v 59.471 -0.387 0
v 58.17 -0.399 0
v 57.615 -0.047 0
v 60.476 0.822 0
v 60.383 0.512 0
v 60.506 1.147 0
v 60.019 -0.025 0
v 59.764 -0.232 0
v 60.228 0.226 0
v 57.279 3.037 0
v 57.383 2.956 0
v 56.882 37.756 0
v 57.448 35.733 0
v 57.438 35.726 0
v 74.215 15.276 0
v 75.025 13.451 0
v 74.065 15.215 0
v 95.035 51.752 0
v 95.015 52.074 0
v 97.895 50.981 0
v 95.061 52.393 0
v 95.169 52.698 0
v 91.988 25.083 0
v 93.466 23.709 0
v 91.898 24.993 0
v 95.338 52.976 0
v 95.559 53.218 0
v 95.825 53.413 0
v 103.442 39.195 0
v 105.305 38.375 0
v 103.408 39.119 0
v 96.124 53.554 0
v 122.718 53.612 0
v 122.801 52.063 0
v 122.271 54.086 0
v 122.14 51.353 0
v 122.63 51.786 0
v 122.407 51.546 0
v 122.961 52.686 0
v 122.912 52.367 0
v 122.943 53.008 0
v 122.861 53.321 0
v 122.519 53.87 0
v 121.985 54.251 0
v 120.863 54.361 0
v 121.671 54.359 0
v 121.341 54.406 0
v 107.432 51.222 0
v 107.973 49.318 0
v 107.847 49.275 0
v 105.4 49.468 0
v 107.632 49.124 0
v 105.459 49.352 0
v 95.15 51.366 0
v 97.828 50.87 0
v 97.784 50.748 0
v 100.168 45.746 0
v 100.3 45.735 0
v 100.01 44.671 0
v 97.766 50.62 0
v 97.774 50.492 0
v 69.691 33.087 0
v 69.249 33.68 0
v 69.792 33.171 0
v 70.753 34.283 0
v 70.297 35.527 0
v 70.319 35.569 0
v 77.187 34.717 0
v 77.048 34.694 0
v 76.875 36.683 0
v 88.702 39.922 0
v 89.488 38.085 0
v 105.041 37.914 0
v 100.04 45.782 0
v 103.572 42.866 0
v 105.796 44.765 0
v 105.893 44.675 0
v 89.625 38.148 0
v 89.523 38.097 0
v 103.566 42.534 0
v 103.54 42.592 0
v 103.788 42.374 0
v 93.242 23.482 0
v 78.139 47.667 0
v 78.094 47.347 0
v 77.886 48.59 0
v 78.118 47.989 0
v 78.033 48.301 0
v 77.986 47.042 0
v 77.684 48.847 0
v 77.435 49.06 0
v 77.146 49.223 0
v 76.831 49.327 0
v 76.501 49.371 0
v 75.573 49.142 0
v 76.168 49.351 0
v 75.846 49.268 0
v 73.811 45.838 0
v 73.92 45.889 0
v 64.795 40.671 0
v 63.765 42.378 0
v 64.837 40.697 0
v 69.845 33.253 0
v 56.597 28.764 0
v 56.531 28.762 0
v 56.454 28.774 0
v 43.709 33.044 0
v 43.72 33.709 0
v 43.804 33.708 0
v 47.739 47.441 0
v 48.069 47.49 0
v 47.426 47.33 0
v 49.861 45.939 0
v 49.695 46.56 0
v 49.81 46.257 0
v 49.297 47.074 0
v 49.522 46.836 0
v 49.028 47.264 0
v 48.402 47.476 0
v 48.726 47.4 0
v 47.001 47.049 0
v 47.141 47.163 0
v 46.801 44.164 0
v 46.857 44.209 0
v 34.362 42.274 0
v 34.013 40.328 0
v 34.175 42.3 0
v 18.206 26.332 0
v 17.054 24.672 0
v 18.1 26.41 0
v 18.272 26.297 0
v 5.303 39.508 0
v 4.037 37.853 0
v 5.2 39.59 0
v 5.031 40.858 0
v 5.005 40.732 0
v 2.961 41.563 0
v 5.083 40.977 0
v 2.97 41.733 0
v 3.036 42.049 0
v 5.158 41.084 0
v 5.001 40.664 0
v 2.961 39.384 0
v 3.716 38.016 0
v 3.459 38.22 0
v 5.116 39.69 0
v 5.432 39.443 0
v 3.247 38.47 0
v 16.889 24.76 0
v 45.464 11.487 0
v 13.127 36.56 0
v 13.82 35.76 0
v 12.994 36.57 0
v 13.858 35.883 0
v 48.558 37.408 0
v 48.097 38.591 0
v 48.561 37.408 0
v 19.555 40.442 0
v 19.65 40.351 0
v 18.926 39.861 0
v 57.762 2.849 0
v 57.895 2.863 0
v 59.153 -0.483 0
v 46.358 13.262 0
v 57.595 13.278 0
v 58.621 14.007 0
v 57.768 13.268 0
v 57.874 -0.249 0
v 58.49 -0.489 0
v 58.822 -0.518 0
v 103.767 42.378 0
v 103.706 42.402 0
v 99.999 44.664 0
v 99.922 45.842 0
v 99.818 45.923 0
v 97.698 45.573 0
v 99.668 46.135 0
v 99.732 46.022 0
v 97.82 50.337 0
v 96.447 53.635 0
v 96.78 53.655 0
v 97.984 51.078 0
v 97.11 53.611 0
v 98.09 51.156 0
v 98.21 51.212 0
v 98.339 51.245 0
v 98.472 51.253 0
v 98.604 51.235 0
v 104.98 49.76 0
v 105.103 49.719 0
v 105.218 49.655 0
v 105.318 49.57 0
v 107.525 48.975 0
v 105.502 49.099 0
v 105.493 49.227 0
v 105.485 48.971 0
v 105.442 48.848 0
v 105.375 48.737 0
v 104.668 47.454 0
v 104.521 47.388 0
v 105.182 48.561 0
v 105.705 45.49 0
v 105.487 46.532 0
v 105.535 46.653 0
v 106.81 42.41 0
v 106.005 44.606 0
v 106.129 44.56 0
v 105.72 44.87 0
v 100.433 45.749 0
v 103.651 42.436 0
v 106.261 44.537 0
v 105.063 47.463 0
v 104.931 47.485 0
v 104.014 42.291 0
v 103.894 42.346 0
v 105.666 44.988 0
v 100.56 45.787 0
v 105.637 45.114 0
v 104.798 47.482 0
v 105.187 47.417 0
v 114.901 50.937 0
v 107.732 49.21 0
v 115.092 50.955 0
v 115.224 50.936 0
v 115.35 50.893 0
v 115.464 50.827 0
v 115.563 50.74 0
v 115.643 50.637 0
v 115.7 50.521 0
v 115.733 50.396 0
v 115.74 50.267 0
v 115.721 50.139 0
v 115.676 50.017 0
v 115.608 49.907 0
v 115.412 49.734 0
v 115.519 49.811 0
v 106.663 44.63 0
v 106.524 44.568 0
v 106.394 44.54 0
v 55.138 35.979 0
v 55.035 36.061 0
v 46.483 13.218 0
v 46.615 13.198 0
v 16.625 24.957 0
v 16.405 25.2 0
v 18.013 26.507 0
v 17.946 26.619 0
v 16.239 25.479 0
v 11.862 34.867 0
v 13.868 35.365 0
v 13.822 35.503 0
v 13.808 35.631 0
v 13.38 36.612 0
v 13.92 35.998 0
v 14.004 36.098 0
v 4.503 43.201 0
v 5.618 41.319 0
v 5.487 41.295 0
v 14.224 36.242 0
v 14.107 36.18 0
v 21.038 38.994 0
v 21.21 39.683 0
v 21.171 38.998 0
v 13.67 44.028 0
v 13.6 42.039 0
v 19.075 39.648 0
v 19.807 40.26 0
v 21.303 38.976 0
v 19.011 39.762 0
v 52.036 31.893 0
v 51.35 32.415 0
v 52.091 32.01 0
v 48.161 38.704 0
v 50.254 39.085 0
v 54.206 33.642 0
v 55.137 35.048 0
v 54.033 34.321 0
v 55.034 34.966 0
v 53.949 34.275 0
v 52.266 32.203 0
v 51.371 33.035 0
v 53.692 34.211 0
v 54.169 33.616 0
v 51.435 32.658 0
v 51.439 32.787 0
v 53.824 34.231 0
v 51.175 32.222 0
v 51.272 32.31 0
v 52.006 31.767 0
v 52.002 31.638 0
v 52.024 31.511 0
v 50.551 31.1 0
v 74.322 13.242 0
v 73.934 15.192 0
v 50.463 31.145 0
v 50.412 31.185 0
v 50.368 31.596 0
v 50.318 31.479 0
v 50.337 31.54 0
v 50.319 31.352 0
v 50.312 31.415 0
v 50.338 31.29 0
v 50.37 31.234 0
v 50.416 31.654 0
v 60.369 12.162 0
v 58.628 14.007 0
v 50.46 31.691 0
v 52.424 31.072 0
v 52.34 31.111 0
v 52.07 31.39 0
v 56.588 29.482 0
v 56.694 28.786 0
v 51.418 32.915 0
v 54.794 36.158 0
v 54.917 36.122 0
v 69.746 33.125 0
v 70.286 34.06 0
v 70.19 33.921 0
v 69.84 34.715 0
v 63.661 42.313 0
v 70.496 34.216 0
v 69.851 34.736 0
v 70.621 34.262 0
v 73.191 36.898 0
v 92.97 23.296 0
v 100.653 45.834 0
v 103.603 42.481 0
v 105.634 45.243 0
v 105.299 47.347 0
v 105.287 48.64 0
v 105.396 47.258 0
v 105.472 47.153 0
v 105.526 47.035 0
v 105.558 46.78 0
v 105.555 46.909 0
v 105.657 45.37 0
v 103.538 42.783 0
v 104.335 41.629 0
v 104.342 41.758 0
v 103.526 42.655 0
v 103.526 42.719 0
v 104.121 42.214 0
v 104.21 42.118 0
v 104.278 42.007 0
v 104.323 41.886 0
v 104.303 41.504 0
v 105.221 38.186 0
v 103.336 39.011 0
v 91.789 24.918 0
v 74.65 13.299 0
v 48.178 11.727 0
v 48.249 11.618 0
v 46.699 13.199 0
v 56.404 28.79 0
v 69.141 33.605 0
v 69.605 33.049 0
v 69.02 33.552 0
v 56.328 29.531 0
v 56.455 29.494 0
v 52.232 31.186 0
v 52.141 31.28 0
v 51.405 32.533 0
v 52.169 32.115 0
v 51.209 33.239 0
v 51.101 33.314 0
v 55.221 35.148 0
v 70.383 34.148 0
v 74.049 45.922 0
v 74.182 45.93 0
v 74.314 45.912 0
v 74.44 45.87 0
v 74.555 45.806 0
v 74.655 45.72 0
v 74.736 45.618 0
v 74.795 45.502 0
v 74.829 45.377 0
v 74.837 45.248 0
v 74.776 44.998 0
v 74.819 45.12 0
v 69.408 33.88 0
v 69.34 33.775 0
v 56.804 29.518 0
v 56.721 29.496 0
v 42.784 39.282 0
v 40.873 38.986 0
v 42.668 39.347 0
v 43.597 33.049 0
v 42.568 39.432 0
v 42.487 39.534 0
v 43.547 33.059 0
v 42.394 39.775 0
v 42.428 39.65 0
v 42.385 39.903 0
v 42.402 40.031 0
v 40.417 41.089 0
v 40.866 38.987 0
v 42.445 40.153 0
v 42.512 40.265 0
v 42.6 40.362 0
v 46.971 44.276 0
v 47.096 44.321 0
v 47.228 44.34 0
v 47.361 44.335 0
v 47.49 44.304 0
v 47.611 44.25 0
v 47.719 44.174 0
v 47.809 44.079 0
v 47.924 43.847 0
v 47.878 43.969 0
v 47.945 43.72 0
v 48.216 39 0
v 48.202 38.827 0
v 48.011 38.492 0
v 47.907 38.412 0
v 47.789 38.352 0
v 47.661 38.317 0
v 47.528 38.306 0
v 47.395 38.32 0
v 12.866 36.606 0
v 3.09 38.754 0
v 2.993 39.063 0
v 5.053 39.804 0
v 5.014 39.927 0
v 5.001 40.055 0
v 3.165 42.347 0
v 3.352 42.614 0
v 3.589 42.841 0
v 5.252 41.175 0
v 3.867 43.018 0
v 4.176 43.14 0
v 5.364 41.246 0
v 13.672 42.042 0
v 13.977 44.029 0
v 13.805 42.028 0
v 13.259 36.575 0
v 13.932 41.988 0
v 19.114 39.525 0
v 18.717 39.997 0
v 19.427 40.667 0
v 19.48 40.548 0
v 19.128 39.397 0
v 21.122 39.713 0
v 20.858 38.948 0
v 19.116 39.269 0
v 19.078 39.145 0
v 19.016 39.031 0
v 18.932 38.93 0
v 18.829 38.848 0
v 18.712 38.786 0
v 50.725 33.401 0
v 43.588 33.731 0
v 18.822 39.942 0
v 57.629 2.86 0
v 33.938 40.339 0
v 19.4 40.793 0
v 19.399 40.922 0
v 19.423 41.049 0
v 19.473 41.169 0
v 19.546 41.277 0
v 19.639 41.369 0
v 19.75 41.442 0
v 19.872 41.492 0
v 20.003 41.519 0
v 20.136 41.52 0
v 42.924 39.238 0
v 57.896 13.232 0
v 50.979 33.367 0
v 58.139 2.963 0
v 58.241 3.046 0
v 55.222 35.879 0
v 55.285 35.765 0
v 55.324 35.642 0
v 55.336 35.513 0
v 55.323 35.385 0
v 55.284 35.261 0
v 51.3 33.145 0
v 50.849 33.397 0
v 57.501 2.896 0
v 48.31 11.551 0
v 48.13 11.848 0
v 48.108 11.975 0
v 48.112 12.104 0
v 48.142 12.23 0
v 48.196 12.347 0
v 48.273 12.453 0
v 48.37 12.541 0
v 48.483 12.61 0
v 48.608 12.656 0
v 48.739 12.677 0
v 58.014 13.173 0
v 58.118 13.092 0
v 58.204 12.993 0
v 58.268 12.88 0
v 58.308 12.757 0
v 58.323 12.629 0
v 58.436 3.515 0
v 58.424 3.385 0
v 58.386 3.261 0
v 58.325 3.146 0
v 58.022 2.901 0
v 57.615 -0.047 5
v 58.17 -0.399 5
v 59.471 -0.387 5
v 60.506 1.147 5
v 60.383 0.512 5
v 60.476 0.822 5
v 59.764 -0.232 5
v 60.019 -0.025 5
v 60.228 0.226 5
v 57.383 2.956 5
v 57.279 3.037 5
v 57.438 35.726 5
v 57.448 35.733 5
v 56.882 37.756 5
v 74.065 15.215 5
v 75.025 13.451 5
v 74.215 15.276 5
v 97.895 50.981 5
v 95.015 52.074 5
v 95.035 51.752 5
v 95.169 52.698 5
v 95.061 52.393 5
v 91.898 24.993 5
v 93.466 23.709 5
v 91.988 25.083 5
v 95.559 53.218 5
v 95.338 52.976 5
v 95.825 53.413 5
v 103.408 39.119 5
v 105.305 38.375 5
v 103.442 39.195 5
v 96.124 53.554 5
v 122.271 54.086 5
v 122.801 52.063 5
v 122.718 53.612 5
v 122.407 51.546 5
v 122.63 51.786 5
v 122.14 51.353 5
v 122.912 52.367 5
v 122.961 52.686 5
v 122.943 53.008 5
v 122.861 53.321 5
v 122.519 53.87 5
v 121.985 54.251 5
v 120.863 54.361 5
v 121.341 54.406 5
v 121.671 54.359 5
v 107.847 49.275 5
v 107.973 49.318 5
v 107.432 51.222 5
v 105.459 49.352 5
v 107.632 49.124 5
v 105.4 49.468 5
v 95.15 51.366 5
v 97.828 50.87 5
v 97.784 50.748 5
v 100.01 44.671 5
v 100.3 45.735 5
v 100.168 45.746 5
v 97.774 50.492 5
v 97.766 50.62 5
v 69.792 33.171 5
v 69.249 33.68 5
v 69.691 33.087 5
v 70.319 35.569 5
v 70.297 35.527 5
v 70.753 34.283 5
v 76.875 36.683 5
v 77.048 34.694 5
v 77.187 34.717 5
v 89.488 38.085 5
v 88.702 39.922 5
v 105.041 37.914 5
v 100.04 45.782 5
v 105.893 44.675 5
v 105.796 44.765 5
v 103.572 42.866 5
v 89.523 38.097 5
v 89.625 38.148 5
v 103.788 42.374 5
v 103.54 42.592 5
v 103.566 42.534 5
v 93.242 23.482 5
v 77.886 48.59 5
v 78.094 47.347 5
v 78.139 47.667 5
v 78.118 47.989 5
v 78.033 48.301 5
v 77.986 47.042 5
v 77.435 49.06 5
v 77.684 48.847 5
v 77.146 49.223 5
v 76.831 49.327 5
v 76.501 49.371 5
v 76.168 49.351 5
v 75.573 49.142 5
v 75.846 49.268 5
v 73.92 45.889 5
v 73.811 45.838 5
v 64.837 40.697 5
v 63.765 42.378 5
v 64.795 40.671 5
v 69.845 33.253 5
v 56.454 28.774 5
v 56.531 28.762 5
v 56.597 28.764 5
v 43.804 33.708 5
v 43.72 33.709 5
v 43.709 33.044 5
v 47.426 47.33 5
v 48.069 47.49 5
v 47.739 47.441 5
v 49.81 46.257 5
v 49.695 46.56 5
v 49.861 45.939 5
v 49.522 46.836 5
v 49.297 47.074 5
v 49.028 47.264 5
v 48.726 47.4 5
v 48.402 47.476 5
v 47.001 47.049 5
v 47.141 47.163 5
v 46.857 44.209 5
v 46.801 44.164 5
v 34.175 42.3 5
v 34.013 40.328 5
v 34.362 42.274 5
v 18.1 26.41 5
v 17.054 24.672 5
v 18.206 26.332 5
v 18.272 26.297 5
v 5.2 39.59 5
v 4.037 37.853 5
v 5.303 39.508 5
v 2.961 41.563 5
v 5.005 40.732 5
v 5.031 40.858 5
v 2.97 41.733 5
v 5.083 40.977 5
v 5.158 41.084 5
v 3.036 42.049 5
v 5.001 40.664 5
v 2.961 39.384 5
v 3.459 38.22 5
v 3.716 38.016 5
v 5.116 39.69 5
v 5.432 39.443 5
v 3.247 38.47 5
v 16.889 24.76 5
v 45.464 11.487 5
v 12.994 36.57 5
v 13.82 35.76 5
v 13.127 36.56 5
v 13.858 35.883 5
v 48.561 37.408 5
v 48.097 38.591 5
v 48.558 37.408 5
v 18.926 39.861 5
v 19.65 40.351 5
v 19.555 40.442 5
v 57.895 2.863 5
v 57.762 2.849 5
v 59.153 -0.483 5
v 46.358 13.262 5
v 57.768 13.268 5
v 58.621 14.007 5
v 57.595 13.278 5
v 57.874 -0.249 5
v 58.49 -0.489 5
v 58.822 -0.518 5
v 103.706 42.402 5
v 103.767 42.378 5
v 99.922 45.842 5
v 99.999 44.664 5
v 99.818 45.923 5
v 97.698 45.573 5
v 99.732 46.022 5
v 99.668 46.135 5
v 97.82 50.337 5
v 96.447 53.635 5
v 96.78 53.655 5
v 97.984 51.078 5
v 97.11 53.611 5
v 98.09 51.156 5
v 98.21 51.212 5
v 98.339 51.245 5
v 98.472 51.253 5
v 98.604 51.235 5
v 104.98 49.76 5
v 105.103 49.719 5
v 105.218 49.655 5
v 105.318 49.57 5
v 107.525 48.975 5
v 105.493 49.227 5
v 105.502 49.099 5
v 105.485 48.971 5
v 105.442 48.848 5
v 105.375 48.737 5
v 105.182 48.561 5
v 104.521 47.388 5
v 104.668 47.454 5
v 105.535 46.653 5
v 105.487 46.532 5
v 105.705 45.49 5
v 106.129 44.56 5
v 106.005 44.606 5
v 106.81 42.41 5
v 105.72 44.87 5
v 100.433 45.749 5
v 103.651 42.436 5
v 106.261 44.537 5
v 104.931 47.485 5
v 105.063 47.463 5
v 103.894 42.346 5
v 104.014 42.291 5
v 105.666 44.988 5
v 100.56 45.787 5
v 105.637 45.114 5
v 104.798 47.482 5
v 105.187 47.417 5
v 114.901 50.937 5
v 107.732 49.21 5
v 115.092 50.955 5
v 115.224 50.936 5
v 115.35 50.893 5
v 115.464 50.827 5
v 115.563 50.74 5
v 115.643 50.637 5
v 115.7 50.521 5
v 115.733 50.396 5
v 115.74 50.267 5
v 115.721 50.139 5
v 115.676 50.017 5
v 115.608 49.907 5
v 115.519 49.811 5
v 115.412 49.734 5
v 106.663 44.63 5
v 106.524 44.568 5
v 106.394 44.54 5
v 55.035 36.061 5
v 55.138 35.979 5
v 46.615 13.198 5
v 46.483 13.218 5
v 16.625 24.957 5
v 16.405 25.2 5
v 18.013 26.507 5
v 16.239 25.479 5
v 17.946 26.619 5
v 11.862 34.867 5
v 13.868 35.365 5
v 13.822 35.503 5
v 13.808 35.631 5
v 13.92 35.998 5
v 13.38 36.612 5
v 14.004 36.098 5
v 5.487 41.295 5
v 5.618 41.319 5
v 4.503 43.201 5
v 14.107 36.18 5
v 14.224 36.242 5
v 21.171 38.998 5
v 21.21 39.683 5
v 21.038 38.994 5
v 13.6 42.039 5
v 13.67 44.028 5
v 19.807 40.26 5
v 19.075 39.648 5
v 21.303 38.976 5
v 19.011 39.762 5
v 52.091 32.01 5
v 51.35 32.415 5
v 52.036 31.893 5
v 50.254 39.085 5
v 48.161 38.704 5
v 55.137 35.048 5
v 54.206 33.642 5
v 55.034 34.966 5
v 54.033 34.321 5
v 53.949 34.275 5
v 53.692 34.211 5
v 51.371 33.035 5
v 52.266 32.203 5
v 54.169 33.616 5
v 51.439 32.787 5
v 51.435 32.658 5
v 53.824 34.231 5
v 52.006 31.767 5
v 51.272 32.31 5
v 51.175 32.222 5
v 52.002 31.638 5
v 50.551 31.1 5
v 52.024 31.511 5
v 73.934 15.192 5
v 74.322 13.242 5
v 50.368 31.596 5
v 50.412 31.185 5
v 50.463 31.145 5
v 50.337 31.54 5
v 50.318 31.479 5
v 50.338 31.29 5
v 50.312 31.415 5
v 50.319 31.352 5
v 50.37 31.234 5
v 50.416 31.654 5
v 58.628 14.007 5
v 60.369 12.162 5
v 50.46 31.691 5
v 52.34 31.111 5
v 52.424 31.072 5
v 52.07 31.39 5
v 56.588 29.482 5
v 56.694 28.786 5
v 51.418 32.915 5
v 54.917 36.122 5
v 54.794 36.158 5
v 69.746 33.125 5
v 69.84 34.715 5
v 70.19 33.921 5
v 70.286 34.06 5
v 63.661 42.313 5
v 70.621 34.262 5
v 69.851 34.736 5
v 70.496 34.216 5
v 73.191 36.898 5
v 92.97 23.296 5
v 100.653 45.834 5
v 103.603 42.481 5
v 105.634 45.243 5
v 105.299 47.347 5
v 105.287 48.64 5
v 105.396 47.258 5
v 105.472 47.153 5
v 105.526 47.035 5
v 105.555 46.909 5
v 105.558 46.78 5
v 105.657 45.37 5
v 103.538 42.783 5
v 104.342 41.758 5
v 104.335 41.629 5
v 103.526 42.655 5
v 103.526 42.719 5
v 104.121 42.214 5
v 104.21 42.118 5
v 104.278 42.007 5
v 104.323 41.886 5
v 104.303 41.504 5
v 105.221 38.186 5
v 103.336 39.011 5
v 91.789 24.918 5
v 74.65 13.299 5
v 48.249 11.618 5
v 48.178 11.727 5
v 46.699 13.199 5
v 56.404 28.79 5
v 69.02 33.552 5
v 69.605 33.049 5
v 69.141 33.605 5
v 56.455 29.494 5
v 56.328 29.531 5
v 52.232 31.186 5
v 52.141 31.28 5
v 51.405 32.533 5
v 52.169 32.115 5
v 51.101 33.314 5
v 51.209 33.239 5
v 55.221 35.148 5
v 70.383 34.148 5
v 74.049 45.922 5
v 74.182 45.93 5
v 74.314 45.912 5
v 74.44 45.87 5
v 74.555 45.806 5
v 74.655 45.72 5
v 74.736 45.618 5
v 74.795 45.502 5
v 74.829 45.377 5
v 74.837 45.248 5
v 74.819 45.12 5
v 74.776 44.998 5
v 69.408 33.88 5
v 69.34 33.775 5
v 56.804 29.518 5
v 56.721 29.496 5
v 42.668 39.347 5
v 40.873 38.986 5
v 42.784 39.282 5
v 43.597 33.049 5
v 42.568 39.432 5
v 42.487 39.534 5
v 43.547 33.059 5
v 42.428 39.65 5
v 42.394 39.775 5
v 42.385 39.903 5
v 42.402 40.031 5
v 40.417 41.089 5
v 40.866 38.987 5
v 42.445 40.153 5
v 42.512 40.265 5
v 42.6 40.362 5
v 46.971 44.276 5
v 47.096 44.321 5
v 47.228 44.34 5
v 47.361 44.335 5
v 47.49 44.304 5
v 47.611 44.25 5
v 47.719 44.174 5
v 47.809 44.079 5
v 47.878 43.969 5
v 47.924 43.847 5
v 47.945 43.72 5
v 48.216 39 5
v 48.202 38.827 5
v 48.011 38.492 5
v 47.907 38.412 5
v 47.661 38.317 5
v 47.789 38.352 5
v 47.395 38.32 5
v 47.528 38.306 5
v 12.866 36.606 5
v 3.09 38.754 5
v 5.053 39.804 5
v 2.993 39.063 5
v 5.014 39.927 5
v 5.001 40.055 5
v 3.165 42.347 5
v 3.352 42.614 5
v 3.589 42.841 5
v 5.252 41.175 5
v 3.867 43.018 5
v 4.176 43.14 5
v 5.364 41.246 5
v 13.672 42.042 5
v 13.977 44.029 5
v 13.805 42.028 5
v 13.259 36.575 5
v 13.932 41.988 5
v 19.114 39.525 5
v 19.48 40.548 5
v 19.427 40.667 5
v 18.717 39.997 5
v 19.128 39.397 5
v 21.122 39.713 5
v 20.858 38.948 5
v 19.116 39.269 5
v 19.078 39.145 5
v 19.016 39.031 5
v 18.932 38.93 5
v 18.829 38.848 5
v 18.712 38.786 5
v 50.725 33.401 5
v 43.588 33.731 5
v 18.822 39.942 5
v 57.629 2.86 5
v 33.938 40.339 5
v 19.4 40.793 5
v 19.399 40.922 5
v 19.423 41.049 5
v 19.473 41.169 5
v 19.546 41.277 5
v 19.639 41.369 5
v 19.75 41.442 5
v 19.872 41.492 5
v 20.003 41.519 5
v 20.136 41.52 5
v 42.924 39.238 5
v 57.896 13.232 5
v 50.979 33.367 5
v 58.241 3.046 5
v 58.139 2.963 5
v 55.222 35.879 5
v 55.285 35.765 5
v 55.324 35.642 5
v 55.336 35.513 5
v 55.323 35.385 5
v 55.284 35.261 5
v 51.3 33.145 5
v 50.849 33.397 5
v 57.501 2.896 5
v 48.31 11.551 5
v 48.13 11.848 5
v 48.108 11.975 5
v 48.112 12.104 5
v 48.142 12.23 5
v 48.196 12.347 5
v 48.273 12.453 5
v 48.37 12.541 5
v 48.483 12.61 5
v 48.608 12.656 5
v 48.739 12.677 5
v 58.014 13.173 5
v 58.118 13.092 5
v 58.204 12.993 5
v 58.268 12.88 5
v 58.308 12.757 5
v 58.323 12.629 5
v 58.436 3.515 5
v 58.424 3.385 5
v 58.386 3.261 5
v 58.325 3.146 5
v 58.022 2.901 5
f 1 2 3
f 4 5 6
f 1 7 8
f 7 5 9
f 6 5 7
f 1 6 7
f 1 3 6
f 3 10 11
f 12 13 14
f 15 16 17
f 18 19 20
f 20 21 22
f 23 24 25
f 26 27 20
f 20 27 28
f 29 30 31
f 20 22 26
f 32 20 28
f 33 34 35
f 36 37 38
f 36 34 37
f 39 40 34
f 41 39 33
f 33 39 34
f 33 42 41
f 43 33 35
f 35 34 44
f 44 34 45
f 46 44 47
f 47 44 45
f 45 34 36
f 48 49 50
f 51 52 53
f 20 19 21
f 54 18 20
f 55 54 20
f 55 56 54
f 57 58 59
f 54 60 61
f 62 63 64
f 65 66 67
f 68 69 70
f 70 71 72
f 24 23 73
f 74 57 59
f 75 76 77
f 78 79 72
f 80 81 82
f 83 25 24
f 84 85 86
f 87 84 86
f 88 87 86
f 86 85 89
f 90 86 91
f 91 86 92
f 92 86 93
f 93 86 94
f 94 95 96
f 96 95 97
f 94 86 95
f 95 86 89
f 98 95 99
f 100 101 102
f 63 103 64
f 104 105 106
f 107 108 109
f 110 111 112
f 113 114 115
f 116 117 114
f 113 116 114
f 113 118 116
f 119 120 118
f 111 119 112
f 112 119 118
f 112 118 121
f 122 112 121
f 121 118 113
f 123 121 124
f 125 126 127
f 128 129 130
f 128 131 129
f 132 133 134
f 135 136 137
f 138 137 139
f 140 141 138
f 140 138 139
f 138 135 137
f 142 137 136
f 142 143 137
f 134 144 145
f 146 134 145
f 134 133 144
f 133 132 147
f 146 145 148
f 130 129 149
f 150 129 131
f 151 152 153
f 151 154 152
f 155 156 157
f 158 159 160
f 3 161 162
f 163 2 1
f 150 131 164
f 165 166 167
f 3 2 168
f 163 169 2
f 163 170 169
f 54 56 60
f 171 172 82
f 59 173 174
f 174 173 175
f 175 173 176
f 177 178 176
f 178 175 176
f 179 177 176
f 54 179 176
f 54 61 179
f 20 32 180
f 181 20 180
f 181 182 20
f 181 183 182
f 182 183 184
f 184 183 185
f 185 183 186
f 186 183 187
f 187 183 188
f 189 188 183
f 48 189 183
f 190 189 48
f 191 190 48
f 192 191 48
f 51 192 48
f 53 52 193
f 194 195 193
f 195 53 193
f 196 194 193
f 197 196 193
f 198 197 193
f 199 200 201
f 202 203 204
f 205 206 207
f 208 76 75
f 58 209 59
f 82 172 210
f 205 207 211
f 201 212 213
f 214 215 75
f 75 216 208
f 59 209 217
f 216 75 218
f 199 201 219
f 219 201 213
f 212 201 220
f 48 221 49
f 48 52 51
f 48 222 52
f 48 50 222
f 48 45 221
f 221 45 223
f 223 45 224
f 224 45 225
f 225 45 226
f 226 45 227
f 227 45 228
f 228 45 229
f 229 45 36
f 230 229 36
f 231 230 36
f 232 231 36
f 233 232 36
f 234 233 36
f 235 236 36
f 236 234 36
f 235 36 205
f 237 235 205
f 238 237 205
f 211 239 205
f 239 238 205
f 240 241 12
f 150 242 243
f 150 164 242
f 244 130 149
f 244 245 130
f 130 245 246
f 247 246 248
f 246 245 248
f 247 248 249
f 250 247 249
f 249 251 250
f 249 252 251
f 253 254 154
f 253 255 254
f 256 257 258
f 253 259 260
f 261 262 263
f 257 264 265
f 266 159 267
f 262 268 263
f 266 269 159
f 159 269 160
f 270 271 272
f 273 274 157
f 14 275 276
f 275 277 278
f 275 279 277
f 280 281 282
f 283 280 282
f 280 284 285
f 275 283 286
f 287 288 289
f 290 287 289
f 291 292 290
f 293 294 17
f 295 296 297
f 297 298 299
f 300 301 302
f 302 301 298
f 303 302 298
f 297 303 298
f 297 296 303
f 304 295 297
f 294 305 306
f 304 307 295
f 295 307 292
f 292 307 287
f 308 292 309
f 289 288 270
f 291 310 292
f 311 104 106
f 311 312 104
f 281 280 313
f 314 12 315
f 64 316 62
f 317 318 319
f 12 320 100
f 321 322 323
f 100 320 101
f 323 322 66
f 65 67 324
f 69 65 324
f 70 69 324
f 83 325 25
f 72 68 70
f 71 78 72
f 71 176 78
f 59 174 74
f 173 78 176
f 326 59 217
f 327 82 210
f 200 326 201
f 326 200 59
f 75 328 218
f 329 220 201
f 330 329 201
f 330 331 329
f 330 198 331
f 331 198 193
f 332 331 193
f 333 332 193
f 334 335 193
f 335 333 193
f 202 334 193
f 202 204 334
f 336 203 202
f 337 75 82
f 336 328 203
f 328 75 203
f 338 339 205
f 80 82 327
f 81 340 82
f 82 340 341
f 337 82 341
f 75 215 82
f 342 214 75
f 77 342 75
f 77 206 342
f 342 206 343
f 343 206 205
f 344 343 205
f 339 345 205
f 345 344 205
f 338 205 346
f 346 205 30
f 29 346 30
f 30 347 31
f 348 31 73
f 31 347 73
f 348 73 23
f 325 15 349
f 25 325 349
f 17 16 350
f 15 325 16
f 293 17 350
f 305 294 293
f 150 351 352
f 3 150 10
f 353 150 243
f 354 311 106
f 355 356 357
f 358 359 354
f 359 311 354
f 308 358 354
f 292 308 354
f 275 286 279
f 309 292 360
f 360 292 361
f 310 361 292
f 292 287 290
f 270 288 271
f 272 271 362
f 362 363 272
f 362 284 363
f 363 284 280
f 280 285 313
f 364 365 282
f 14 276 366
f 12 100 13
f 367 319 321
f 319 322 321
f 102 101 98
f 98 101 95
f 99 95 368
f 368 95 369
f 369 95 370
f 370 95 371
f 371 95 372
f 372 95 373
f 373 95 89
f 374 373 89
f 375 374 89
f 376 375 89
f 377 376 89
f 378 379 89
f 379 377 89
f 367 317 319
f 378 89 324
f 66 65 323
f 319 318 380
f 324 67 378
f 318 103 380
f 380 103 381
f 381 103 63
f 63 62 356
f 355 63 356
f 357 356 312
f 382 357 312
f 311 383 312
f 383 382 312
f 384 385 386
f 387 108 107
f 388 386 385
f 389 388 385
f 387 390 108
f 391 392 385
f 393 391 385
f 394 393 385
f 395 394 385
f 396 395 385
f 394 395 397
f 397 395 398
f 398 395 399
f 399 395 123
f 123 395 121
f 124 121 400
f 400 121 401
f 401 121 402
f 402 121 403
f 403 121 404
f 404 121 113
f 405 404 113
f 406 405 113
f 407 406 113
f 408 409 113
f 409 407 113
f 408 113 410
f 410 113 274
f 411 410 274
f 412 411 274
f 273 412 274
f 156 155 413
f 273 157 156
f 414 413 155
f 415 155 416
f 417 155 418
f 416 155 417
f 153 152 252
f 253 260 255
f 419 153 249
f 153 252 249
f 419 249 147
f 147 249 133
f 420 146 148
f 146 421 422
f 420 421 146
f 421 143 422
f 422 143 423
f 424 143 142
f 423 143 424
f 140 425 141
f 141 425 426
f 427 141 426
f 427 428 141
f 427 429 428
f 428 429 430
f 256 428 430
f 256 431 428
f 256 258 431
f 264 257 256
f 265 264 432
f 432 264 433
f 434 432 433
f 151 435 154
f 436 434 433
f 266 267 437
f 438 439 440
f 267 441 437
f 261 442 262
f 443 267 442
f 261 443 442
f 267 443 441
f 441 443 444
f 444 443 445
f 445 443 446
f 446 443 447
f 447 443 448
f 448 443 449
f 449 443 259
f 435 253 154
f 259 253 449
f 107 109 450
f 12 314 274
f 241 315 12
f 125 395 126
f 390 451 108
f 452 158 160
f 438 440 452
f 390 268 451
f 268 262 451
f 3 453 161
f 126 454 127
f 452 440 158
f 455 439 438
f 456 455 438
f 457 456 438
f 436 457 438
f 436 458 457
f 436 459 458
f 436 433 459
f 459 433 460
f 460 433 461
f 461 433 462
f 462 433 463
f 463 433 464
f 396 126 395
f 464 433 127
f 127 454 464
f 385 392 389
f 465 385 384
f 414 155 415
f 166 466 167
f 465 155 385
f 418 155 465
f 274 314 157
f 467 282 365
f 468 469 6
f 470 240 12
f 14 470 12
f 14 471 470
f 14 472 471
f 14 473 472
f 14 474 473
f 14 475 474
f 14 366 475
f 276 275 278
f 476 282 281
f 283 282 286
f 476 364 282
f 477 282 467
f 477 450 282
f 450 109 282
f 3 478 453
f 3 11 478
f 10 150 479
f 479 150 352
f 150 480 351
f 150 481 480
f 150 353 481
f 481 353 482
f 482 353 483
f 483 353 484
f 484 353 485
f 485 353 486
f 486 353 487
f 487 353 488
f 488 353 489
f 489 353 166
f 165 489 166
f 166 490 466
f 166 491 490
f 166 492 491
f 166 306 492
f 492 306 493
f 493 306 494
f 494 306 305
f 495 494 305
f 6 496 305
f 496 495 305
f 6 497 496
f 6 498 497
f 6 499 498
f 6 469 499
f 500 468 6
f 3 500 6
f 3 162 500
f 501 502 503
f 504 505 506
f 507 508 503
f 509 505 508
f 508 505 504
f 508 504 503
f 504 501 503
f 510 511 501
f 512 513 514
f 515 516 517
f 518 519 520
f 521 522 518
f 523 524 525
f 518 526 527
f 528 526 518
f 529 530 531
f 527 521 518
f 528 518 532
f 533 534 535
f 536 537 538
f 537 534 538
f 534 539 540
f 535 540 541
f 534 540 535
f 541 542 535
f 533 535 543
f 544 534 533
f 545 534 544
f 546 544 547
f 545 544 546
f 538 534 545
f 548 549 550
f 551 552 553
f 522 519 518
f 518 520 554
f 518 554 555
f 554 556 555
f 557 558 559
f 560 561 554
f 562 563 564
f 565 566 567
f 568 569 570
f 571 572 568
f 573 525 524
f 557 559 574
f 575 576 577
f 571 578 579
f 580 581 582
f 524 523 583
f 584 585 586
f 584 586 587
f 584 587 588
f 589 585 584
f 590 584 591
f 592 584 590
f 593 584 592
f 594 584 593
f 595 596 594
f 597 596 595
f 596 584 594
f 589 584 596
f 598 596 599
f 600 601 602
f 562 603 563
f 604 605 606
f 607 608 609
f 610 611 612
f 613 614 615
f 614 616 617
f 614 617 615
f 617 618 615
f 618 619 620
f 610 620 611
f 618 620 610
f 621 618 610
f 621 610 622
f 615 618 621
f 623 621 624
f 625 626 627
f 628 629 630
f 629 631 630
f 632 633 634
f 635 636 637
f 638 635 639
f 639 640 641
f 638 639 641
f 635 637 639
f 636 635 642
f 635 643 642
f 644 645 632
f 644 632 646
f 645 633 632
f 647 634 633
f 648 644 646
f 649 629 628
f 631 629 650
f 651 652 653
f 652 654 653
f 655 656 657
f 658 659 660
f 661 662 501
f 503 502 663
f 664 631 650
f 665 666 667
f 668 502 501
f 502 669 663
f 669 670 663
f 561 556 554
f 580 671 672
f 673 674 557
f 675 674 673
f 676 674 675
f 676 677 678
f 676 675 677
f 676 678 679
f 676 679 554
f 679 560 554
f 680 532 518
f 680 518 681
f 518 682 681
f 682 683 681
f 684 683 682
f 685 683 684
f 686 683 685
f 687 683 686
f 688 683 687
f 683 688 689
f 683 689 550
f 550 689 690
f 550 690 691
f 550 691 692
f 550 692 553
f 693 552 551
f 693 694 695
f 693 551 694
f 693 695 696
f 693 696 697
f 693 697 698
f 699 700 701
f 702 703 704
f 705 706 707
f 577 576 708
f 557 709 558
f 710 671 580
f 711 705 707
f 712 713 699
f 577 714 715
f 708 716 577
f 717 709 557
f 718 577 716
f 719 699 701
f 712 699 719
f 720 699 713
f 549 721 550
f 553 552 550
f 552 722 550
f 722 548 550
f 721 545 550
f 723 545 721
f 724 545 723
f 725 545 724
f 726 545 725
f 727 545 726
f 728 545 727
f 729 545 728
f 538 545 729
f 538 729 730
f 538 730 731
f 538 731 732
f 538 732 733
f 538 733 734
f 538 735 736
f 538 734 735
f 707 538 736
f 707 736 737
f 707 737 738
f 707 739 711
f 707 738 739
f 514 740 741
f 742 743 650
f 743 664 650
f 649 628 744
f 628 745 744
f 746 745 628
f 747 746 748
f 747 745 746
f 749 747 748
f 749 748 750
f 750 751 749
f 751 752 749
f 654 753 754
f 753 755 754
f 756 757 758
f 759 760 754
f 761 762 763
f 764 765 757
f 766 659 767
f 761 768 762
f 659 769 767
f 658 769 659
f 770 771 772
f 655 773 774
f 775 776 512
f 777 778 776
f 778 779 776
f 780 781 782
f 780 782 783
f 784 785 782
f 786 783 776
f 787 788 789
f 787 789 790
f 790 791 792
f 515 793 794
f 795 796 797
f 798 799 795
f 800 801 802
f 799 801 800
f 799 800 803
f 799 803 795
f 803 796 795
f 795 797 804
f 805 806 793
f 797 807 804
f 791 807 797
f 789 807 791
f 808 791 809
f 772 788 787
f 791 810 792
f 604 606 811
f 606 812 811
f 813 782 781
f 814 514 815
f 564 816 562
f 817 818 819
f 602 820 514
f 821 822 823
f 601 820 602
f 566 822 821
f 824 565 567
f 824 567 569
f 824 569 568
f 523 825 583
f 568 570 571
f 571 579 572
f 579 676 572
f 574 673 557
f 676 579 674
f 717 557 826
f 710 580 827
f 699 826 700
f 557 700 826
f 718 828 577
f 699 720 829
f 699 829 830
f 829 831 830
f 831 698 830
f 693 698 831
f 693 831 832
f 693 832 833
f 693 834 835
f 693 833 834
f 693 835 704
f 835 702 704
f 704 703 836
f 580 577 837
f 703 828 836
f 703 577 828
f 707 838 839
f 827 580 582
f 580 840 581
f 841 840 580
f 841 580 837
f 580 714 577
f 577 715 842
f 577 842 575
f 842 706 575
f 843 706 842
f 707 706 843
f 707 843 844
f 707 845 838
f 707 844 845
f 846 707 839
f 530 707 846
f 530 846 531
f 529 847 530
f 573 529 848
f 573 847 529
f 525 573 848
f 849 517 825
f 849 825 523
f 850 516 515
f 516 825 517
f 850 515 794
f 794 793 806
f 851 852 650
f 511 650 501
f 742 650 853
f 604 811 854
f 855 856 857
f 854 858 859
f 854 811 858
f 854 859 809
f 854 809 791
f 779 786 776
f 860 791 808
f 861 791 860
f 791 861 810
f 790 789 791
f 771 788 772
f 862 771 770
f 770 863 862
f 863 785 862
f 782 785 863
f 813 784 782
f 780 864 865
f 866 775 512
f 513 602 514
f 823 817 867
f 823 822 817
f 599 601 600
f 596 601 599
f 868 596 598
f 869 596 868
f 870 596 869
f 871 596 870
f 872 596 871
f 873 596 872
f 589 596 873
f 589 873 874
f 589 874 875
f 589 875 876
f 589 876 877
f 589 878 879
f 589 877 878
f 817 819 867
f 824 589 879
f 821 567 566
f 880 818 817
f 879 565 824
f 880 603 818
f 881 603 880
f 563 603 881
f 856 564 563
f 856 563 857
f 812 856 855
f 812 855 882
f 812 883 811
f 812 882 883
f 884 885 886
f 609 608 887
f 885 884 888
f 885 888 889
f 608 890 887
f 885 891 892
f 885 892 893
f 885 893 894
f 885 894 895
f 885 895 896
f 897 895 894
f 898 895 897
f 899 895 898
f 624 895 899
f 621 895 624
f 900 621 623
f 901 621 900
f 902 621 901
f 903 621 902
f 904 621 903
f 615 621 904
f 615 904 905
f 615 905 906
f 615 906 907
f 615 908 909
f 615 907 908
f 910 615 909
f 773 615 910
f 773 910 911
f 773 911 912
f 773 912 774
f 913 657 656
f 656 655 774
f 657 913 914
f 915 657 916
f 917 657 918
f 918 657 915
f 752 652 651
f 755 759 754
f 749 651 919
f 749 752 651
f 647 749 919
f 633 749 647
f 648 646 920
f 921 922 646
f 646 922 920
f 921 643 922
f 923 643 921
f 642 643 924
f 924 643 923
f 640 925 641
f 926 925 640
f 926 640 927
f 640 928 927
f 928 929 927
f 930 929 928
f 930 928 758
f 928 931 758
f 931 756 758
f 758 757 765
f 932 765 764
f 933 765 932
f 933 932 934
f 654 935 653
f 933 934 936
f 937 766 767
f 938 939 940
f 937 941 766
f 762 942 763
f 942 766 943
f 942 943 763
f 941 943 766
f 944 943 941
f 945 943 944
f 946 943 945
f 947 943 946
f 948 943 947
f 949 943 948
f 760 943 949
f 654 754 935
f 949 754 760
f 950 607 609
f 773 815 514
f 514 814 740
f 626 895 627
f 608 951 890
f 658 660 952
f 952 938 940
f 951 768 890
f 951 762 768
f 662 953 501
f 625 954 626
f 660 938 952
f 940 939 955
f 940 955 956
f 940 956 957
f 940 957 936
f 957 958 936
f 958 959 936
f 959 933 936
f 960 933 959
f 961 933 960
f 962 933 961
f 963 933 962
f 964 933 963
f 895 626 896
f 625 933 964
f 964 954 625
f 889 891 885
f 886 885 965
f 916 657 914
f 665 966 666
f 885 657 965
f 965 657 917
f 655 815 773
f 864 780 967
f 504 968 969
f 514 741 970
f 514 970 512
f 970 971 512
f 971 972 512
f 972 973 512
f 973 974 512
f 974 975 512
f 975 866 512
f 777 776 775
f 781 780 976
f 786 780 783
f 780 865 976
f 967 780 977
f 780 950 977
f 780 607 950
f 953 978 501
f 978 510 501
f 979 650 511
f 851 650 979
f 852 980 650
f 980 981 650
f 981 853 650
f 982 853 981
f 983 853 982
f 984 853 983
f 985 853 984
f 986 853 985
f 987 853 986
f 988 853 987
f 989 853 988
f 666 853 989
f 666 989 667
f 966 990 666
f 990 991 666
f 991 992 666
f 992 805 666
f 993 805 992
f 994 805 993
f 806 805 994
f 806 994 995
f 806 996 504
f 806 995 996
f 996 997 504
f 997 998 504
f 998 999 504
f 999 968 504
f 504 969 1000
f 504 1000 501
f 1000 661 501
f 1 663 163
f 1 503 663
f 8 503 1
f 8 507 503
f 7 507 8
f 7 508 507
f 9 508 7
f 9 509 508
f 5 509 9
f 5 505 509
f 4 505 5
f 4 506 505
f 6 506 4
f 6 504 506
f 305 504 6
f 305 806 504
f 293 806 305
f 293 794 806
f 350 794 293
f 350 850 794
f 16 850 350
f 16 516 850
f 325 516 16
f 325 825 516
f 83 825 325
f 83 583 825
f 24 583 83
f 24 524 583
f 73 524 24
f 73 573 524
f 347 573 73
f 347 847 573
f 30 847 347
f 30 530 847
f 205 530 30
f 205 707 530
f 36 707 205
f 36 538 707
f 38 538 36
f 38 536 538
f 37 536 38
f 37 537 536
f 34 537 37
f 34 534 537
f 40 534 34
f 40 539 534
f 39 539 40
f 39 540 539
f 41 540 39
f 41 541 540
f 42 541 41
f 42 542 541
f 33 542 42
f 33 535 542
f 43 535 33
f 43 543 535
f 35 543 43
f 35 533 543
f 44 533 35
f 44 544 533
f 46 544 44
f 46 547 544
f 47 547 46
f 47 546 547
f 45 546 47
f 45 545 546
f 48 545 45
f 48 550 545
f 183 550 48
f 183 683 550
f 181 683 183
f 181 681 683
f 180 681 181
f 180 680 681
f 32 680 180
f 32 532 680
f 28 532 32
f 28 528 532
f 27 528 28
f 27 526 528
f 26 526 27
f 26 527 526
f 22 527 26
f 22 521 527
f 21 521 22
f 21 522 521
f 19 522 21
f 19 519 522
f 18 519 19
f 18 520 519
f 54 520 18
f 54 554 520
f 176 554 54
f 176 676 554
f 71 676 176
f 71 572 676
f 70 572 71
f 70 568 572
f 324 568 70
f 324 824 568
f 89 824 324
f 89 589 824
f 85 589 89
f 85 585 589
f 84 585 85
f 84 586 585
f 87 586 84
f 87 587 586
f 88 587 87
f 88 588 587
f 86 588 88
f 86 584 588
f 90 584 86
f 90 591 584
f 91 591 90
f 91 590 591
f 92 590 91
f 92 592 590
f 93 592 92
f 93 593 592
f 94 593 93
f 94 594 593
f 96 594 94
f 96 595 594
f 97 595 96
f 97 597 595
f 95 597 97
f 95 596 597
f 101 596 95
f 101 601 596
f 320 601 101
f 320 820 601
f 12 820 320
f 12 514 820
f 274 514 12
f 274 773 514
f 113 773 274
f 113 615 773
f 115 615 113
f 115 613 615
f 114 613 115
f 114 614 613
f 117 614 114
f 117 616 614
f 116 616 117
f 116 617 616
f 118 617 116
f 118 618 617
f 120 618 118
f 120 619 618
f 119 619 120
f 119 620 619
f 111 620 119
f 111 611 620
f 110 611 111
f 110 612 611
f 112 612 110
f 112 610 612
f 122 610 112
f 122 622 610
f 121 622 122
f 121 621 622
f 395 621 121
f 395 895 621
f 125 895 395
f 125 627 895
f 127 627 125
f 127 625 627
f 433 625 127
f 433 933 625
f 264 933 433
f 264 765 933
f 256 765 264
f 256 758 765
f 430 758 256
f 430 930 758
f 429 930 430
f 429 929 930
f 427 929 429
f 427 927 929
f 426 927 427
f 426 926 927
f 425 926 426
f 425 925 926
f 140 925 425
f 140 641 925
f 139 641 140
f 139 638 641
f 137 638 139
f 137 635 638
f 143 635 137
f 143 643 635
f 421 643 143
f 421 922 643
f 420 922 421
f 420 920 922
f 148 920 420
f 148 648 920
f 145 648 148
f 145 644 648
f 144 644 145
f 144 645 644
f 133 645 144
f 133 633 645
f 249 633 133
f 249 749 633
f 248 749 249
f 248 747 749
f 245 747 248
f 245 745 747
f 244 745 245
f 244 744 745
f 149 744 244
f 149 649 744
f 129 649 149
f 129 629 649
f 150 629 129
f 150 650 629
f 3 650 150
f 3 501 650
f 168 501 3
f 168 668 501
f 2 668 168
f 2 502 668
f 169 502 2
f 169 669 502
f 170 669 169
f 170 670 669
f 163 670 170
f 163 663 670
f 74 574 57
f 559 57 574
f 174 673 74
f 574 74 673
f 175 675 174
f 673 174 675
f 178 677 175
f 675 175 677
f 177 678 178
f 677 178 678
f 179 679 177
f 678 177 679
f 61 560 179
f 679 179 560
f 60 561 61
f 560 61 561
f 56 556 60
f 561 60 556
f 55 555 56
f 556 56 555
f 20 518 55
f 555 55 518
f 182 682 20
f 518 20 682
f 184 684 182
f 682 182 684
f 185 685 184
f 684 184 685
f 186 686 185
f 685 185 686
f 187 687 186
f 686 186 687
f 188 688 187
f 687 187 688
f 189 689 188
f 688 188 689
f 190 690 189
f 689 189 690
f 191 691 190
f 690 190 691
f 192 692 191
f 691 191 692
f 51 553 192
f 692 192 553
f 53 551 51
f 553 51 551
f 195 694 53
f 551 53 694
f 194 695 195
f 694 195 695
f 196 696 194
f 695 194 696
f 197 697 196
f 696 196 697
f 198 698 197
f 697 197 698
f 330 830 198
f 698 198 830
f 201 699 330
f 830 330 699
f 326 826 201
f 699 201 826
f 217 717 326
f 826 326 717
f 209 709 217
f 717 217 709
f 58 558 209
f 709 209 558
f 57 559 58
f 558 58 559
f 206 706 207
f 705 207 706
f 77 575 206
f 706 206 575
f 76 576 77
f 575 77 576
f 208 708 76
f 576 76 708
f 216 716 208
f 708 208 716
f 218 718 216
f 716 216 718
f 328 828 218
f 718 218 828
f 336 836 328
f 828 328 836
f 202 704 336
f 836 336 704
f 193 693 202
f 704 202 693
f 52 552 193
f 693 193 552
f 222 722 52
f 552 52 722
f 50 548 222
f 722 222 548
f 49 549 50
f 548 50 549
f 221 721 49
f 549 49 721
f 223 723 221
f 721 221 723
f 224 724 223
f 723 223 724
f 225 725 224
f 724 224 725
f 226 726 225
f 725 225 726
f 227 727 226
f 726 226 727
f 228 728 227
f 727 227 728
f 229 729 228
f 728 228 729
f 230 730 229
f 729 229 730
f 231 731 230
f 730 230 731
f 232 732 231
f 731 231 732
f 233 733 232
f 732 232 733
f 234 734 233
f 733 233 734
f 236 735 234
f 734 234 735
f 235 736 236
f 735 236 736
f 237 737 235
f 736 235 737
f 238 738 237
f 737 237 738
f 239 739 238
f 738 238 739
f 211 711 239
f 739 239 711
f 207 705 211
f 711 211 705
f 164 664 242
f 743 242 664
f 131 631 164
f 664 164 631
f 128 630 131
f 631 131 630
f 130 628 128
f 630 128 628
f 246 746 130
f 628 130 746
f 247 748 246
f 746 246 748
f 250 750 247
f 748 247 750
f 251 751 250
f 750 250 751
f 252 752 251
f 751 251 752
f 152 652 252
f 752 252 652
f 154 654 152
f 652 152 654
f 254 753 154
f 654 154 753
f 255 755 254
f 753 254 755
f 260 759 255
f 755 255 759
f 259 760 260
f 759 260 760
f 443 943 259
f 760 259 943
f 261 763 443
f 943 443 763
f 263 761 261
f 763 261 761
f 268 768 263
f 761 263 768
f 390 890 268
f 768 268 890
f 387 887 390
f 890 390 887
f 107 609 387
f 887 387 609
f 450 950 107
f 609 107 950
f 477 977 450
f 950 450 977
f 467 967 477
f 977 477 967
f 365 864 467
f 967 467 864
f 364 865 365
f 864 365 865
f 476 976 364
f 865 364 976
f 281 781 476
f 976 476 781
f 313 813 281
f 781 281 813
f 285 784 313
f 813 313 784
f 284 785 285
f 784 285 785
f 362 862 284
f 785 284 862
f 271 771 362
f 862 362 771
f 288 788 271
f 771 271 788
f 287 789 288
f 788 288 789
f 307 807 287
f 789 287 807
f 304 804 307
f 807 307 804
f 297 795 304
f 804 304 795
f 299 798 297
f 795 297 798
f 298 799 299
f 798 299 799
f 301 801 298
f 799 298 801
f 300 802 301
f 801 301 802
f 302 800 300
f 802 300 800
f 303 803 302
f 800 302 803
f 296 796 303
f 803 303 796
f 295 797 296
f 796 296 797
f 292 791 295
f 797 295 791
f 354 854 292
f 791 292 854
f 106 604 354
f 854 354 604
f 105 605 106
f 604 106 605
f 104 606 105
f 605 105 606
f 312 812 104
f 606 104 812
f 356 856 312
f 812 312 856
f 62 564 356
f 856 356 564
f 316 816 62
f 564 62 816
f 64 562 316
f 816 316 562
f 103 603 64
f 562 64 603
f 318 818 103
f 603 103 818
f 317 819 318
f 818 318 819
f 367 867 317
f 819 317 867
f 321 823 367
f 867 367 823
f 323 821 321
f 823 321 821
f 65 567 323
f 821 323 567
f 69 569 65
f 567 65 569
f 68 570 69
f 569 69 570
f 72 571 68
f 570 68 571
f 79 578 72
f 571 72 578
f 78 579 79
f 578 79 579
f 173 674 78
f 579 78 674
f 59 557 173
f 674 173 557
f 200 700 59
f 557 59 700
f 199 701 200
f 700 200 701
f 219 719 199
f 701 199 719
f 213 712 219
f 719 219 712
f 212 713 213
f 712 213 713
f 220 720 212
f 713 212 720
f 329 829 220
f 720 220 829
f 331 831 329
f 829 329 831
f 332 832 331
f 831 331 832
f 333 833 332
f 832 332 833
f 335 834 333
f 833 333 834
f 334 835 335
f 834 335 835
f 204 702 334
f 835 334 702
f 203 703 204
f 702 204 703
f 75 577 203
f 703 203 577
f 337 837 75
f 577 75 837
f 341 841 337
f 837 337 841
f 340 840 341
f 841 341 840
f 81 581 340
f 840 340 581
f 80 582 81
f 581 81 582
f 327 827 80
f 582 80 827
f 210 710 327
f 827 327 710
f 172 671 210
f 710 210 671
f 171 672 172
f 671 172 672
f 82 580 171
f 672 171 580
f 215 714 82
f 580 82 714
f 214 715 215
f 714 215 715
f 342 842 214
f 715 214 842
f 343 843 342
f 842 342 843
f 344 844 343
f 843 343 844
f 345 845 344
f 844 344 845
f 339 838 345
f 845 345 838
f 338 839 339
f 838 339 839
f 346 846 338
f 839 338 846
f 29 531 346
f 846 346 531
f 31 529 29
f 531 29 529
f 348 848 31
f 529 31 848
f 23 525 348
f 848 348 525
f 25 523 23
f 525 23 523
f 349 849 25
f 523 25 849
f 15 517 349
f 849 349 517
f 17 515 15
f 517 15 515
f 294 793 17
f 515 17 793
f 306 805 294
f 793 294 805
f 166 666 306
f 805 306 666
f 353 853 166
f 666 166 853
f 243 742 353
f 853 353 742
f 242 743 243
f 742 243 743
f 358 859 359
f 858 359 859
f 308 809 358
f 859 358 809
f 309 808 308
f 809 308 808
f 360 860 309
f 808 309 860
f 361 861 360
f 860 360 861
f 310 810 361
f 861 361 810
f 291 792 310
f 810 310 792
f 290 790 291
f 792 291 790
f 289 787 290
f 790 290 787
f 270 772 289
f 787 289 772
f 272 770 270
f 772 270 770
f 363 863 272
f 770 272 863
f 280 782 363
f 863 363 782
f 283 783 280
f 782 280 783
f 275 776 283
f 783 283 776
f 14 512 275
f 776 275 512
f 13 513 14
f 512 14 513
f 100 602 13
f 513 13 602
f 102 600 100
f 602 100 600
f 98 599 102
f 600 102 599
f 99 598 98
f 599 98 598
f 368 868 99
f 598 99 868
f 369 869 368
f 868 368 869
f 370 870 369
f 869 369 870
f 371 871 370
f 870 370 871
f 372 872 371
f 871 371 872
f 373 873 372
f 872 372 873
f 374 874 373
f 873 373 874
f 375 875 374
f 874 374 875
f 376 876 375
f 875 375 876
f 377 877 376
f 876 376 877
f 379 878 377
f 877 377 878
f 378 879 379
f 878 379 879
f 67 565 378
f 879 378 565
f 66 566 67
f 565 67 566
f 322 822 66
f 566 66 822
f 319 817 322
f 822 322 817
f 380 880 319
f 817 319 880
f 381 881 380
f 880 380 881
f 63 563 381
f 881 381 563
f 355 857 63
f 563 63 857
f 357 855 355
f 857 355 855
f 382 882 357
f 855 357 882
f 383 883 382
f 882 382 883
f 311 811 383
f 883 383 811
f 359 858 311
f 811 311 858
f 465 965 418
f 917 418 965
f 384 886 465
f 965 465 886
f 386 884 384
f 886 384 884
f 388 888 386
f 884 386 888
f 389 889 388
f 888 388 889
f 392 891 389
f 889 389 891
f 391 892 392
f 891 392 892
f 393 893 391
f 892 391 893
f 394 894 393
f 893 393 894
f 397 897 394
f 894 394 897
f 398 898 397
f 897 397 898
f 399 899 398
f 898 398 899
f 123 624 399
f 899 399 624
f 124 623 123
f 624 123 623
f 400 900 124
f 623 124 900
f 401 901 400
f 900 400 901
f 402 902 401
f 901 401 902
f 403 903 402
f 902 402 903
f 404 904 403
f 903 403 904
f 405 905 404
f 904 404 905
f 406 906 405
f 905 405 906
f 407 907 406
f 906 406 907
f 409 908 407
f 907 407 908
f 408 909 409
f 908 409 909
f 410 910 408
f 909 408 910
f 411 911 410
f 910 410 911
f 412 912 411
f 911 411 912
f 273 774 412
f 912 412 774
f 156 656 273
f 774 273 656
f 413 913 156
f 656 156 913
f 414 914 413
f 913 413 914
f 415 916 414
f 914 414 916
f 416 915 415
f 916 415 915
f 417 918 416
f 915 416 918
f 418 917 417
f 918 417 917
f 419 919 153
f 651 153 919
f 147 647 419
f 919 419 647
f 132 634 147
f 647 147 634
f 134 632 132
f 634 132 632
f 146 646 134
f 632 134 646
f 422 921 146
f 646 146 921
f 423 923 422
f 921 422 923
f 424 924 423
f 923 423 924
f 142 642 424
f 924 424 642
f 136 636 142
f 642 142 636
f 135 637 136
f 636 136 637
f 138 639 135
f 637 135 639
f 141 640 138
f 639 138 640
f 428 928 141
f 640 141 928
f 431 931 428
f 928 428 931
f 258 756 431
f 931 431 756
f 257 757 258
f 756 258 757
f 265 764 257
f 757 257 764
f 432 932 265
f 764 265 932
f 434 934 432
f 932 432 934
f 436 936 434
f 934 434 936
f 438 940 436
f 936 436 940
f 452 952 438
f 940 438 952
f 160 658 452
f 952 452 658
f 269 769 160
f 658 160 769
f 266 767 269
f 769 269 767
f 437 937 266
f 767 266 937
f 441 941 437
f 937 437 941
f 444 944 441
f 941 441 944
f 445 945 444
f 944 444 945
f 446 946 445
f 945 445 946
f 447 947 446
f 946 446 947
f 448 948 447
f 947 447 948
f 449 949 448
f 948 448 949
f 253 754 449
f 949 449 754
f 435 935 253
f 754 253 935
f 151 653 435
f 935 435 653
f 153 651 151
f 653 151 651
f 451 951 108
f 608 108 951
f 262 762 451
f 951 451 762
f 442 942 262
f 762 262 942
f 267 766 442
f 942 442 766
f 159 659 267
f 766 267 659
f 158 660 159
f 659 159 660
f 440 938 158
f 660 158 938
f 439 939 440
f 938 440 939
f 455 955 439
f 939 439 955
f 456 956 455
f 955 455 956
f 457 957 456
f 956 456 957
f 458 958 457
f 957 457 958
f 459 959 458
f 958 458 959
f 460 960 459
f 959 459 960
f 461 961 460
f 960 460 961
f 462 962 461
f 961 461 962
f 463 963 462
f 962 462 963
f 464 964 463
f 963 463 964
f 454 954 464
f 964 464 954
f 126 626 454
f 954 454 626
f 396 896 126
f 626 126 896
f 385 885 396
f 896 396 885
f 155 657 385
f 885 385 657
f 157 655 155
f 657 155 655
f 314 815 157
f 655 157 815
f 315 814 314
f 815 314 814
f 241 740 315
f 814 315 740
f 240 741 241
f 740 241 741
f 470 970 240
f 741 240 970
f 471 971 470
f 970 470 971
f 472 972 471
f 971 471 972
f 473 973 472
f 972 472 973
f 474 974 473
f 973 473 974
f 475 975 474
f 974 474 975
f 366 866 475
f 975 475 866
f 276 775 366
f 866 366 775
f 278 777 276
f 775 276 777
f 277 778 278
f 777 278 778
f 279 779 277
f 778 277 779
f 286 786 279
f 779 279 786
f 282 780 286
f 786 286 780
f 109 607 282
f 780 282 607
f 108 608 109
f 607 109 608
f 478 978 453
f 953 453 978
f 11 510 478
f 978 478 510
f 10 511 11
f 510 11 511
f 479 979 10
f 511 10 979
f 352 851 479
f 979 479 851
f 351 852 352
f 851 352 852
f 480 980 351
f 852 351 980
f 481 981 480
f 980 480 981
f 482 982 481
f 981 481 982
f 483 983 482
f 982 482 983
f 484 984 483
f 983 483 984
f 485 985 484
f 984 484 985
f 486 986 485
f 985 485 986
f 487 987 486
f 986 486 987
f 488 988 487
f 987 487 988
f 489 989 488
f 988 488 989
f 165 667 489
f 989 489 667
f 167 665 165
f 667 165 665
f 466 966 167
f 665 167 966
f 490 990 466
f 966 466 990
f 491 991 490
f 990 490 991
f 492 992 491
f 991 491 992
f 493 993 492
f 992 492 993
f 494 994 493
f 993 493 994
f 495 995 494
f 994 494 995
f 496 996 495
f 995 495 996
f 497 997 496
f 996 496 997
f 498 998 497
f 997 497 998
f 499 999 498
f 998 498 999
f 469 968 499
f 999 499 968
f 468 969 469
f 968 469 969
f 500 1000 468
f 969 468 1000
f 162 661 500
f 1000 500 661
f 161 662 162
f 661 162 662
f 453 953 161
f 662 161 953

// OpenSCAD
/*
 * Customizable Origami - Dolphin - https://www.thingiverse.com/thing:2664065
 * by Dennis Hofmann - https://www.thingiverse.com/mightynozzle/about
 * created 2017-11-23
 * version v1.0
 *
 * Changelog
 * --------------
 * v1.0:
 *      - final design
 * --------------
 * 
 * This work is licensed under the Creative Commons - Attribution - NonCommercial - ShareAlike license.
 * https://creativecommons.org/licenses/by-nc-sa/3.0/
 */


 // Parameter Section //
//-------------------//

// preview[view:north, tilt:top]

// The maximum size of the longest side. The shorter side will be automatically resized in same ratio.
max_size_in_millimeter = 120; //[20:300]

// The height of the model.
model_height_in_millimeter = 5; //[0.2:0.2:100]

// Thickness of the outer outline.
outline_size_in_millimeter = 2.1; //[0.5:0.1:20]

// Thickness of the inner outline.
inline_size_in_millimeter = 0.7; //[0.5:0.1:20]

// Roundiness of the ends of the inner outlines.
inline_edge_radius_in_millimeter = 0.7; //[0.0:0.1:5]

// Flip model
flip_model = "no"; //[yes,no]

/*[hidden]*/
max_size = max_size_in_millimeter;
model_height = model_height_in_millimeter;
$fn=32;

// Outer Points
A1 = [60, 524];
A2 = [169, 481];
A3 = [229, 348];
A4 = [598, 171];
A5 = [757, 15];
A6 = [755, 182];
A7 = [955, 198];
A8 = [1186, 329];
A9 = [1335, 518];
A10 = [1357, 579];
A11 = [1561, 702];
A12 = [1383, 659];
A13 = [1245, 692];
A14 = [1285, 598];
A15 = [1151, 511];
A16 = [992, 466];
A17 = [909, 471];
A18 = [984, 635];
A19 = [832, 545];
A20 = [737, 479];
A21 = [626, 502];
A22 = [620, 610];
A23 = [527, 523];
A24 = [438, 541];
A25 = [178, 564];
A26 = [60, 553];

outline = [A1, A2, A3, A4, A5, A6, A7, A8, A9, A10, A11, A12, A13, A14, A15, A16, A17, A18, A19, A20, A21, A22, A23, A24, A25, A26];

// Inner Points
B1 = [652, 418];
B2 = [728, 387];
B3 = [895, 444];
B4 = [695, 451];
B5 = [903, 460];
B6 = [1337, 568];
B7 = [562, 444];
B8 = [271, 524];

// Polygons
C1 = [A4, A5, A6];
C2 = [B1, B4, A20, A19, A18, A17, B5, B3, B2];
C3 = [A21, A22, A23];
C4 = [A14, A13, A12];
C5 = [B6, A12, A11, A10];
C6 = [A25, B8, B7, B4, A20, A21, A23, A24];
C7 = [B5, A16, A17];
C8 = [A26, A1, A2, B8, A25];
C9 = [A2, A3, A4, A6, A7, A8, A9, A10, B6, A12, A14, A15, A16, B5, B3, B2, B1, B4, B7, B8];

cut_polygons = [C1, C2, C3, C4, C5, C6, C7, C8, C9];

min_x = A1[0];
min_y = A5[1];
max_x = A11[0];
max_y = A11[1];

x_size = max_x - min_x;
y_size = max_y - min_y;

x_factor = max_size / x_size;
y_factor = max_size / y_size;

inline_size = x_size > y_size ? inline_size_in_millimeter / x_factor / 2: inline_size_in_millimeter / y_factor / 2;
inline_edge_radius = x_size > y_size ? inline_edge_radius_in_millimeter / x_factor: inline_edge_radius_in_millimeter / y_factor;
outline_size = x_size > y_size ? outline_size_in_millimeter / x_factor - inline_size: outline_size_in_millimeter / y_factor - inline_size;


 // Program Section //
//-----------------//

if(x_size > y_size) {
    resize(newsize=[max_size, x_factor * y_size, model_height]){
        if(flip_model == "yes") {
            mirror([0,1,0]) {
                rotate([180,180,0]) {    
                    create(outline, cut_polygons);
                }
            }
        } else {
            create(outline, cut_polygons);
        }
    }
} else {
    resize(newsize=[y_factor * x_size, max_size, model_height]){
        if(flip_model == "yes") {
            mirror([0,1,0]) {
                rotate([180,180,0]) {    
                    create(outline, cut_polygons);
                }
            }
        } else {
            create(outline, cut_polygons);
        }
    }
}


 // Module Section //
//----------------//

module create() {
    linear_extrude(height=1) {
        difference() {
            offset(r = -0) {
                offset(r = +outline_size) {
                    polygon(points = outline, convexity = 10);
                }
            }
            
            for(cut_polygon = [0:len(cut_polygons)]) {
                offset(r = +inline_edge_radius) {
                    offset(r = -inline_size - inline_edge_radius) {
                        polygon(points = cut_polygons[cut_polygon], convexity = 10);
                    }
                }
            }
        }
    }
}
